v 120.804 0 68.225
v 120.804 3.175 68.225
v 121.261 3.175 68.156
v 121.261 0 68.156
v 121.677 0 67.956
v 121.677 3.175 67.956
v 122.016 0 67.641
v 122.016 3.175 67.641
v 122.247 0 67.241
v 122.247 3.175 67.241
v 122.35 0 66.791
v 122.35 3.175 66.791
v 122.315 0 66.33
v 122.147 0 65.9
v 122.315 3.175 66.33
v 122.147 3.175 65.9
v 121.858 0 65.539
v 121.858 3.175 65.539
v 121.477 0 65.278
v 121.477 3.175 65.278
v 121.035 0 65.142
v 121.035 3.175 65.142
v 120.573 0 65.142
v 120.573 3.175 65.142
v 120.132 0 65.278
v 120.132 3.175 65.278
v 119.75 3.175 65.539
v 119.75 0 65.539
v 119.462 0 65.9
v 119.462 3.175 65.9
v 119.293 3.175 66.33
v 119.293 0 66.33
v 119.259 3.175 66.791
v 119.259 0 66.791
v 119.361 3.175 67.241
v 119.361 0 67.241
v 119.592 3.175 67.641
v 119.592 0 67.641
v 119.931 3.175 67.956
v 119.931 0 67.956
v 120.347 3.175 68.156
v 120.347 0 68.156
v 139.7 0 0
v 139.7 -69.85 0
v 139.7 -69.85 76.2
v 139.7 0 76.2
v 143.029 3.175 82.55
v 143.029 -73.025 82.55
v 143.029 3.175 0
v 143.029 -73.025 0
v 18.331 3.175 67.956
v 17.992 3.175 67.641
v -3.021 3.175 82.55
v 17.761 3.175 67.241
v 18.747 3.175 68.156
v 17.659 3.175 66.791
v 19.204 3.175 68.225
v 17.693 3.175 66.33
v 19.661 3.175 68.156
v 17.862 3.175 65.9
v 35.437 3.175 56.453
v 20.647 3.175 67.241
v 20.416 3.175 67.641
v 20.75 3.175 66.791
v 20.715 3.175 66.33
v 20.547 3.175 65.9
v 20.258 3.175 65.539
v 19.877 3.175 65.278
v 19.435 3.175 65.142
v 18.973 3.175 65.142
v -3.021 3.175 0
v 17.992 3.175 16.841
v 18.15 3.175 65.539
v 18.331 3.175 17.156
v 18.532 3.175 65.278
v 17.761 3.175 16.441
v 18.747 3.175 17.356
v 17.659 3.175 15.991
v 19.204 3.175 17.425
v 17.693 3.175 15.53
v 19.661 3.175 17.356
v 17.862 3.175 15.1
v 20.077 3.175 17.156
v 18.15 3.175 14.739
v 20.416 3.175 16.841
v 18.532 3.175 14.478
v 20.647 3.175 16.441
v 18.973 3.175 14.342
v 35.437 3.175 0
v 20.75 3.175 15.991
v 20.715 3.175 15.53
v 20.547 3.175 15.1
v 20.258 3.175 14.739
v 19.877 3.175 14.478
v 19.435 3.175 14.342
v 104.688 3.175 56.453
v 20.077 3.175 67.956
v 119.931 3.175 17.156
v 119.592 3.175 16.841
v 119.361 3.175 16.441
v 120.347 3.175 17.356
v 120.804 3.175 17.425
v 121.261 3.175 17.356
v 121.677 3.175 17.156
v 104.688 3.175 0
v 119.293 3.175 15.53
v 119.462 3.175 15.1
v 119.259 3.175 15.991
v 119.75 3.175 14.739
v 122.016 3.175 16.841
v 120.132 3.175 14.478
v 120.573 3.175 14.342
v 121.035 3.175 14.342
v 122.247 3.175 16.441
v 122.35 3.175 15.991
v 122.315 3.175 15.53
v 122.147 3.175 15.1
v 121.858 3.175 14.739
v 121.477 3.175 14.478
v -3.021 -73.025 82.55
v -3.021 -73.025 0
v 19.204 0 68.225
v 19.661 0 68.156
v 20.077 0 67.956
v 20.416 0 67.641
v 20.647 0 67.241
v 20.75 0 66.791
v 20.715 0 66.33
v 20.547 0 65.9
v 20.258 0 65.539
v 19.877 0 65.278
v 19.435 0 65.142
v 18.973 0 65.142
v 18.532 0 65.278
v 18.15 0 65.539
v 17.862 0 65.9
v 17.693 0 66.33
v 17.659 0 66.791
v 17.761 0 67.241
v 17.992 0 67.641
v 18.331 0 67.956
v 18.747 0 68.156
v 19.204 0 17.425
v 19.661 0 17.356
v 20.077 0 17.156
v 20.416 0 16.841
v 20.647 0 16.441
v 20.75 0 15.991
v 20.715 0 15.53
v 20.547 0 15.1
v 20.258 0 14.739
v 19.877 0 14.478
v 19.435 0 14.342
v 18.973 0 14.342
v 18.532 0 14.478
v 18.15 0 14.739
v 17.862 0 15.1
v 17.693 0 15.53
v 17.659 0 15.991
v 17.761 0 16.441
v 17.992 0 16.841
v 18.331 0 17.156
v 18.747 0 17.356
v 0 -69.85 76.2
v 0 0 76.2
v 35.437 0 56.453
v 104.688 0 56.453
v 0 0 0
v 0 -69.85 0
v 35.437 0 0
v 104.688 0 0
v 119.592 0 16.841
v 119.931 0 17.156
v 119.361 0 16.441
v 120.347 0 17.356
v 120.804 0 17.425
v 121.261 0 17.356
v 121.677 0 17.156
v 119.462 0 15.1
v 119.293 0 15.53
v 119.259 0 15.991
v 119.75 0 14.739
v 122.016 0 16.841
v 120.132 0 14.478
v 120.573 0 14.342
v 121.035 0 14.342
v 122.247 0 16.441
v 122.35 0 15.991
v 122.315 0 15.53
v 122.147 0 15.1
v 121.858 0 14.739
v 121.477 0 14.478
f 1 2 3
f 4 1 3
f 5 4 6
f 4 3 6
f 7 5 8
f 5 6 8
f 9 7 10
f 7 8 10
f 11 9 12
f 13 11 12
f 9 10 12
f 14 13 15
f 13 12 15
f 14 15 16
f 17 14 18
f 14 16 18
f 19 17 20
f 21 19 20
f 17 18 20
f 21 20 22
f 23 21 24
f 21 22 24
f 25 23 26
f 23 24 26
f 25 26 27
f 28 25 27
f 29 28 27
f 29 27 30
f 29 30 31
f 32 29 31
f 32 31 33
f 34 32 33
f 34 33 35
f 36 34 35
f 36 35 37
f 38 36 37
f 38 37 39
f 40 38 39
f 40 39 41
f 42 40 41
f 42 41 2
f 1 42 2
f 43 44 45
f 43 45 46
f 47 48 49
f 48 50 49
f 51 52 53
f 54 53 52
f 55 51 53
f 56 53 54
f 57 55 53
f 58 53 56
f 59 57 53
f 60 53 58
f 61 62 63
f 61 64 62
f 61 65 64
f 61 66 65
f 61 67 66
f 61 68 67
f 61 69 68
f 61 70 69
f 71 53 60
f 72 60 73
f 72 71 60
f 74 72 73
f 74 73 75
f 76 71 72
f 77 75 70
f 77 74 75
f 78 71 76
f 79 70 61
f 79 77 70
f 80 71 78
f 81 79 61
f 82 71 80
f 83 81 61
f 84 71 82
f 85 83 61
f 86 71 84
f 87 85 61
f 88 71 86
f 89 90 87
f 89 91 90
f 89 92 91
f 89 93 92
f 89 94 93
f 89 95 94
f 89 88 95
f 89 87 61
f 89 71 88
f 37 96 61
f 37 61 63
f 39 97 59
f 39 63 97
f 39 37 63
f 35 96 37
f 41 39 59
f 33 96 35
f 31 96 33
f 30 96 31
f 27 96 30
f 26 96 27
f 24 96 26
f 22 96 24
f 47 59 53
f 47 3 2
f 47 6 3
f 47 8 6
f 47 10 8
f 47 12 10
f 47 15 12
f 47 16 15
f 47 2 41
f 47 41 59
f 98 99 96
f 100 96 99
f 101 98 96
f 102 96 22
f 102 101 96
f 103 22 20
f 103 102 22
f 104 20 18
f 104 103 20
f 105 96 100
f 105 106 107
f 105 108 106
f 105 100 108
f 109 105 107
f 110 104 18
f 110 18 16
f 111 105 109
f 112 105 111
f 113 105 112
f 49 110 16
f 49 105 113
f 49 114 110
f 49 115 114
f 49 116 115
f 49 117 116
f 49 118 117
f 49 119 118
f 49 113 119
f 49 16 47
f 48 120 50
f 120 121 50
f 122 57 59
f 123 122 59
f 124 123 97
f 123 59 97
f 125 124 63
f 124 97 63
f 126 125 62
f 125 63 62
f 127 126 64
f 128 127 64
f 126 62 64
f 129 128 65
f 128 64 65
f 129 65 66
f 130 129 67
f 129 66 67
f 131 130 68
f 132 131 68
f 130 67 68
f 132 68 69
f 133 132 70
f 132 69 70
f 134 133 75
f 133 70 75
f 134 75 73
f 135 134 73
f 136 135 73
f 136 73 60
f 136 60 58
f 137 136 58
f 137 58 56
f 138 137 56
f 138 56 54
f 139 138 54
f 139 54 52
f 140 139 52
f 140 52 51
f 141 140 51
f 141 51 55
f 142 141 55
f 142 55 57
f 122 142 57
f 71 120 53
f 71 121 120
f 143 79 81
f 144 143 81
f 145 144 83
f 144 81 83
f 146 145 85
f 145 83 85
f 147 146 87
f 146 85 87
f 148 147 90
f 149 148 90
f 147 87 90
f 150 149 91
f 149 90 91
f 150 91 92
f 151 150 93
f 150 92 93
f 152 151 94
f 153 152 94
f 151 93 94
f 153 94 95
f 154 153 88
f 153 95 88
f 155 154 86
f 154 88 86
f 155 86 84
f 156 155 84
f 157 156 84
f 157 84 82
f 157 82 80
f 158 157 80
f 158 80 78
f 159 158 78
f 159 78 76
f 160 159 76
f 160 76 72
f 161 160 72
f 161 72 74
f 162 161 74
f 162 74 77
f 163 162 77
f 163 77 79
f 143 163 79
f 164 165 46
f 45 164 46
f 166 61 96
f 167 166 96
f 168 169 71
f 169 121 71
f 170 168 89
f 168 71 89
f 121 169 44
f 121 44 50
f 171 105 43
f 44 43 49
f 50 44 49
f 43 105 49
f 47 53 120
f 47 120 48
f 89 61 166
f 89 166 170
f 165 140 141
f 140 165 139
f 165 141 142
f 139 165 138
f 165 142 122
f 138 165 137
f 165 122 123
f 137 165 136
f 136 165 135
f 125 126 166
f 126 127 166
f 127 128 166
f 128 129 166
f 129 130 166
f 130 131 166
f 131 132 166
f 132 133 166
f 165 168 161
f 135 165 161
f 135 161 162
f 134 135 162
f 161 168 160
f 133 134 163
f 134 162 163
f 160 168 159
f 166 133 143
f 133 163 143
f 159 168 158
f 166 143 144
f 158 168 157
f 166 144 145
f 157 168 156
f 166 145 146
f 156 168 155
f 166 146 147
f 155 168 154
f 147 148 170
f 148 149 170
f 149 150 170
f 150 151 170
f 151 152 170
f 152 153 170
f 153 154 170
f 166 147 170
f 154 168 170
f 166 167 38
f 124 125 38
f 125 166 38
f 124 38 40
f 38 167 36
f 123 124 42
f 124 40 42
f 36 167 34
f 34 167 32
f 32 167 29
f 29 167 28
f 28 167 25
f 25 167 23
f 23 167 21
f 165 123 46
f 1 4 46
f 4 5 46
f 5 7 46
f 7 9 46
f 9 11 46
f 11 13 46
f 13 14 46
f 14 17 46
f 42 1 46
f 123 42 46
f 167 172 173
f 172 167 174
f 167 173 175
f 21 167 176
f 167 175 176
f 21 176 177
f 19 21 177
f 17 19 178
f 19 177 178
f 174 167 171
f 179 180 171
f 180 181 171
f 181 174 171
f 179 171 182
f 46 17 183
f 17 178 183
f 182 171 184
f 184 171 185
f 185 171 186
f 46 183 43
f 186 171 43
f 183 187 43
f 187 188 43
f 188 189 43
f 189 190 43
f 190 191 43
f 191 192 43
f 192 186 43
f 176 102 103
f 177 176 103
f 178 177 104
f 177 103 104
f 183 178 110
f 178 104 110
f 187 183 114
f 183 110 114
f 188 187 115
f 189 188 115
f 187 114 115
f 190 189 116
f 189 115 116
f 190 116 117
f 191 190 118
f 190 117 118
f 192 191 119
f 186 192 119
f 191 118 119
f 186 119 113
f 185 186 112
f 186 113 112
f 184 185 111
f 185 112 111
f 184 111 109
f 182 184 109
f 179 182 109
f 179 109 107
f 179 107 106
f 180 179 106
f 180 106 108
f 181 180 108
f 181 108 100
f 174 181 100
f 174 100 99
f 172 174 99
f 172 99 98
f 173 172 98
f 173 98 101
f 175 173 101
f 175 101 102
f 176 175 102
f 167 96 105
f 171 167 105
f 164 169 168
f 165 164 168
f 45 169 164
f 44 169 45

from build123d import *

# Parameters (mm, degrees)
SKETCH1_W           = 146.05
SKETCH1_H           = 76.2
SKETCH1_W_2         = 139.7
SKETCH1_H_2         = 69.85
BOSS_EXTRUDE1_DEPTH = 76.2
SKETCH2_W           = 146.05
SKETCH2_H           = 76.2
BOSS_EXTRUDE2_DEPTH = 6.35
SKETCH3_R           = 1.55
CUT_EXTRUDE1_DEPTH  = 6.35
SKETCH4_W           = 69.251410207
SKETCH4_H           = 56.45274813
CUT_EXTRUDE2_DEPTH  = 25.4


with BuildPart() as part:
    # Sketch1 → Boss-Extrude1 (new body)
    with BuildSketch(Plane.XY):
        with Locations((70.004169971, -34.925)):
            Rectangle(SKETCH1_W, SKETCH1_H)
        with Locations((69.85, -34.925)):
            Rectangle(SKETCH1_W_2, SKETCH1_H_2, mode=Mode.SUBTRACT)
    extrude(amount=BOSS_EXTRUDE1_DEPTH)

    # Sketch2 → Boss-Extrude2 (add)
    with BuildSketch(Plane.XY.offset(76.2)):
        with Locations((70.004169971, -34.925)):
            Rectangle(SKETCH2_W, SKETCH2_H)
    extrude(amount=BOSS_EXTRUDE2_DEPTH)

    # Sketch3 → Cut-Extrude1 (cut)
    with BuildSketch(Plane(origin=(0, 3.175, 0), x_dir=(1, 0, 0), z_dir=(0, 1, 0))):
        with Locations(Location((19.204169971, -15.875, 0), (0, 0, 270))):
            Circle(SKETCH3_R)
        with Locations(Location((120.804169971, -15.875, 0), (0, 0, 270))):
            Circle(SKETCH3_R)
        with Locations(Location((120.804169971, -66.675, 0), (0, 0, 270))):
            Circle(SKETCH3_R)
        with Locations(Location((19.204169971, -66.675, 0), (0, 0, 270))):
            Circle(SKETCH3_R)
    extrude(amount=-CUT_EXTRUDE1_DEPTH, mode=Mode.SUBTRACT)

    # Sketch4 → Cut-Extrude2 (cut)
    with BuildSketch(Plane(origin=(0, 3.175, 0), x_dir=(1, 0, 0), z_dir=(0, 1, 0))):
        with Locations((70.062674023, -28.226374065)):
            Rectangle(SKETCH4_W, SKETCH4_H)
    extrude(amount=-CUT_EXTRUDE2_DEPTH, mode=Mode.SUBTRACT)


solid = part.part
